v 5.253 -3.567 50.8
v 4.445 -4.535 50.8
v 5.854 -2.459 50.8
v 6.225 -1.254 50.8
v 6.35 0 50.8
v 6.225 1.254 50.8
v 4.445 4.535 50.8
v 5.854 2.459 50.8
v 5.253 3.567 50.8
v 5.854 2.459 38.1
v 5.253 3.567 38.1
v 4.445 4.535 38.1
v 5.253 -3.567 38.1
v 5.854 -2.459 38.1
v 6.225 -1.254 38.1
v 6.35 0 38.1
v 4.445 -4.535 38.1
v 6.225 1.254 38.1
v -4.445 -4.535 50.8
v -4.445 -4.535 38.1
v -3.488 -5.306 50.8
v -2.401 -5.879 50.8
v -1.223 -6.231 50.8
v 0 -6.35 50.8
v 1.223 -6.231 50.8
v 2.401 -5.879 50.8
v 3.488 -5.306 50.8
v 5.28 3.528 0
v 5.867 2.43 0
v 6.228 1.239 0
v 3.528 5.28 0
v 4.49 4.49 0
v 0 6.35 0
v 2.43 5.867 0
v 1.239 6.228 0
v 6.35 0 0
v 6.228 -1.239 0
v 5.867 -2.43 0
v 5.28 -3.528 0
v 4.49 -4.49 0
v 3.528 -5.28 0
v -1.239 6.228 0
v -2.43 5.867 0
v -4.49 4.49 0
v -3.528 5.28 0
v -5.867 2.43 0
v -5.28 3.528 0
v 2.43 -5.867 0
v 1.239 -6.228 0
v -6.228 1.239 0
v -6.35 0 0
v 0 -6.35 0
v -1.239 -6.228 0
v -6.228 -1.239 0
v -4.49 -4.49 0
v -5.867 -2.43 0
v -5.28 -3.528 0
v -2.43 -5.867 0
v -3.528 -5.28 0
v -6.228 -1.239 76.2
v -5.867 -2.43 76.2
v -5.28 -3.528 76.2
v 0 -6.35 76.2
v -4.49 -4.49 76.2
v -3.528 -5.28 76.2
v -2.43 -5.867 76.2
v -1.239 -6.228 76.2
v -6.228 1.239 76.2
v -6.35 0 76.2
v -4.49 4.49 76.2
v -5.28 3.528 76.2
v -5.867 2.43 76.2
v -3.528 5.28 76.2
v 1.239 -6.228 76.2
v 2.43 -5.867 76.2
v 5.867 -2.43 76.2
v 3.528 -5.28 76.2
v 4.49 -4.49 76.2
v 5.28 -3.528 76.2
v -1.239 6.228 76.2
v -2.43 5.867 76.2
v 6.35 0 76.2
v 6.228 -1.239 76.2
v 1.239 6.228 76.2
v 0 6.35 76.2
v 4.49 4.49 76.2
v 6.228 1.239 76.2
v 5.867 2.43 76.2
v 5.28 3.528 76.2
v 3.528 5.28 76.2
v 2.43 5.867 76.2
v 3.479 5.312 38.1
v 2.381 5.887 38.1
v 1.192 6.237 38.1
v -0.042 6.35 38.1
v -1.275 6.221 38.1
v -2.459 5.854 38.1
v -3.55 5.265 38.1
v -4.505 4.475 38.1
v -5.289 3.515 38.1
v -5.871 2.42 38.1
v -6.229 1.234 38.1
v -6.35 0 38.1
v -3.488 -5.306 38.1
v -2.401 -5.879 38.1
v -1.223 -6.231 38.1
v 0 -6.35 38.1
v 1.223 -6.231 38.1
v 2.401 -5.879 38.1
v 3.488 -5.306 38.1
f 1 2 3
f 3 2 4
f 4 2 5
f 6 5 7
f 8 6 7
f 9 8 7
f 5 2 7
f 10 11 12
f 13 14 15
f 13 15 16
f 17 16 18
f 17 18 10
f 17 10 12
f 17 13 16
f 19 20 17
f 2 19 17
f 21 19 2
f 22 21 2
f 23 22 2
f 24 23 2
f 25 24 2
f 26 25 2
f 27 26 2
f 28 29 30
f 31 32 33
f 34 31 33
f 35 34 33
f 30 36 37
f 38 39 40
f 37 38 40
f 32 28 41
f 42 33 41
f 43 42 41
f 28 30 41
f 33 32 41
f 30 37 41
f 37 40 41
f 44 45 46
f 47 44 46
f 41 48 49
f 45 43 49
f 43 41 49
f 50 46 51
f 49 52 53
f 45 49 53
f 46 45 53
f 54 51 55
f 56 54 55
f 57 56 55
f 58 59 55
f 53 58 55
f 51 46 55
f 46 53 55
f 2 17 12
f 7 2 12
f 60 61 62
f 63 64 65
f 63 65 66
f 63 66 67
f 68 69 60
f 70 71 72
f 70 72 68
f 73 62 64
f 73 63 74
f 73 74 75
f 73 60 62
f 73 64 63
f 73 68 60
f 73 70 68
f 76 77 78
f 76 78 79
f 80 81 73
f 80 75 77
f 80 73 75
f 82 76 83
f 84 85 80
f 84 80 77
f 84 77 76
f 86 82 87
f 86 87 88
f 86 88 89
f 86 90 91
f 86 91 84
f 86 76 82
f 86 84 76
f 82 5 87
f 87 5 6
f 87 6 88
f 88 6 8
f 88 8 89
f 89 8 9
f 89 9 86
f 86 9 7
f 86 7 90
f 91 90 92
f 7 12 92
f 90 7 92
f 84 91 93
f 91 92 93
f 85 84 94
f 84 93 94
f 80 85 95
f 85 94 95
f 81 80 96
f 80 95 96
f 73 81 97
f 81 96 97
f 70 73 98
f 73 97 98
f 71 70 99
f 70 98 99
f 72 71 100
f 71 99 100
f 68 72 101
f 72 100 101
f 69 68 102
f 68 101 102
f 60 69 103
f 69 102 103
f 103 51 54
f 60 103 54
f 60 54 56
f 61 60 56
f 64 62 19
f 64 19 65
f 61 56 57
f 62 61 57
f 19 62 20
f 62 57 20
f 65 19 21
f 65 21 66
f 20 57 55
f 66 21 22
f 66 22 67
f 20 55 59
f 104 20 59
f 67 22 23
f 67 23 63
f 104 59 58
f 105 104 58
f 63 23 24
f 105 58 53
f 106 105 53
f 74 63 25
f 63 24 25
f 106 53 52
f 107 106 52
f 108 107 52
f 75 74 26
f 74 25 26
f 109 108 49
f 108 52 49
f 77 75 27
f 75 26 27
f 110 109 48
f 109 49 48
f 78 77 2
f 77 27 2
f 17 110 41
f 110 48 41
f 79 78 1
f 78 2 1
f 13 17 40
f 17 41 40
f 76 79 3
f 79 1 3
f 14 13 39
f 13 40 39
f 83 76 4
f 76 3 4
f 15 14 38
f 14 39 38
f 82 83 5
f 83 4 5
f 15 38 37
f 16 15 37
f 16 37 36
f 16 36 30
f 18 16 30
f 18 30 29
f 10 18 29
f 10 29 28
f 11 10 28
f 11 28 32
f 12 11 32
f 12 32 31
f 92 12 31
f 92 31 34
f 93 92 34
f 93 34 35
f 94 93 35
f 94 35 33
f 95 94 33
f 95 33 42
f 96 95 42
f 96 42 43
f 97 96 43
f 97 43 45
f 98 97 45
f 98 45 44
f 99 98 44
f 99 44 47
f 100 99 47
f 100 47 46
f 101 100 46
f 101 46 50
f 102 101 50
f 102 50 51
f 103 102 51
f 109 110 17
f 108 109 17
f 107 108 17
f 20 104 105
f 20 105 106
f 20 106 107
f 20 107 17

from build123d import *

# Parameters (mm, degrees)
SKETCH1_R           = 6.35
BOSS_EXTRUDE1_DEPTH = 38.1
BOSS_EXTRUDE2_DEPTH = 12.7
SKETCH3_R           = 6.35
BOSS_EXTRUDE3_DEPTH = 25.4


with BuildPart() as part:
    # Sketch1 → Boss-Extrude1 (new body)
    with BuildSketch(Plane.XY):
        with Locations(Location((0, 0, 0), (0, 0, 180))):
            Circle(SKETCH1_R)
    extrude(amount=BOSS_EXTRUDE1_DEPTH)

    # Sketch2 → Boss-Extrude2 (add)
    with BuildSketch(Plane.XY.offset(38.1)):
        with BuildLine():
            Line((-4.445, -4.534807052), (4.445, -4.534807052))
            Line((4.445, -4.534807052), (4.445, 4.534807052))
            ThreePointArc((4.445, 4.534807052), (-4.534807052, 4.445), (-4.445, -4.534807052))
        make_face()
    extrude(amount=BOSS_EXTRUDE2_DEPTH)

    # Sketch3 → Boss-Extrude3 (add)
    with BuildSketch(Plane.XY.offset(50.8)):
        Circle(SKETCH3_R)
    extrude(amount=BOSS_EXTRUDE3_DEPTH)


solid = part.part
